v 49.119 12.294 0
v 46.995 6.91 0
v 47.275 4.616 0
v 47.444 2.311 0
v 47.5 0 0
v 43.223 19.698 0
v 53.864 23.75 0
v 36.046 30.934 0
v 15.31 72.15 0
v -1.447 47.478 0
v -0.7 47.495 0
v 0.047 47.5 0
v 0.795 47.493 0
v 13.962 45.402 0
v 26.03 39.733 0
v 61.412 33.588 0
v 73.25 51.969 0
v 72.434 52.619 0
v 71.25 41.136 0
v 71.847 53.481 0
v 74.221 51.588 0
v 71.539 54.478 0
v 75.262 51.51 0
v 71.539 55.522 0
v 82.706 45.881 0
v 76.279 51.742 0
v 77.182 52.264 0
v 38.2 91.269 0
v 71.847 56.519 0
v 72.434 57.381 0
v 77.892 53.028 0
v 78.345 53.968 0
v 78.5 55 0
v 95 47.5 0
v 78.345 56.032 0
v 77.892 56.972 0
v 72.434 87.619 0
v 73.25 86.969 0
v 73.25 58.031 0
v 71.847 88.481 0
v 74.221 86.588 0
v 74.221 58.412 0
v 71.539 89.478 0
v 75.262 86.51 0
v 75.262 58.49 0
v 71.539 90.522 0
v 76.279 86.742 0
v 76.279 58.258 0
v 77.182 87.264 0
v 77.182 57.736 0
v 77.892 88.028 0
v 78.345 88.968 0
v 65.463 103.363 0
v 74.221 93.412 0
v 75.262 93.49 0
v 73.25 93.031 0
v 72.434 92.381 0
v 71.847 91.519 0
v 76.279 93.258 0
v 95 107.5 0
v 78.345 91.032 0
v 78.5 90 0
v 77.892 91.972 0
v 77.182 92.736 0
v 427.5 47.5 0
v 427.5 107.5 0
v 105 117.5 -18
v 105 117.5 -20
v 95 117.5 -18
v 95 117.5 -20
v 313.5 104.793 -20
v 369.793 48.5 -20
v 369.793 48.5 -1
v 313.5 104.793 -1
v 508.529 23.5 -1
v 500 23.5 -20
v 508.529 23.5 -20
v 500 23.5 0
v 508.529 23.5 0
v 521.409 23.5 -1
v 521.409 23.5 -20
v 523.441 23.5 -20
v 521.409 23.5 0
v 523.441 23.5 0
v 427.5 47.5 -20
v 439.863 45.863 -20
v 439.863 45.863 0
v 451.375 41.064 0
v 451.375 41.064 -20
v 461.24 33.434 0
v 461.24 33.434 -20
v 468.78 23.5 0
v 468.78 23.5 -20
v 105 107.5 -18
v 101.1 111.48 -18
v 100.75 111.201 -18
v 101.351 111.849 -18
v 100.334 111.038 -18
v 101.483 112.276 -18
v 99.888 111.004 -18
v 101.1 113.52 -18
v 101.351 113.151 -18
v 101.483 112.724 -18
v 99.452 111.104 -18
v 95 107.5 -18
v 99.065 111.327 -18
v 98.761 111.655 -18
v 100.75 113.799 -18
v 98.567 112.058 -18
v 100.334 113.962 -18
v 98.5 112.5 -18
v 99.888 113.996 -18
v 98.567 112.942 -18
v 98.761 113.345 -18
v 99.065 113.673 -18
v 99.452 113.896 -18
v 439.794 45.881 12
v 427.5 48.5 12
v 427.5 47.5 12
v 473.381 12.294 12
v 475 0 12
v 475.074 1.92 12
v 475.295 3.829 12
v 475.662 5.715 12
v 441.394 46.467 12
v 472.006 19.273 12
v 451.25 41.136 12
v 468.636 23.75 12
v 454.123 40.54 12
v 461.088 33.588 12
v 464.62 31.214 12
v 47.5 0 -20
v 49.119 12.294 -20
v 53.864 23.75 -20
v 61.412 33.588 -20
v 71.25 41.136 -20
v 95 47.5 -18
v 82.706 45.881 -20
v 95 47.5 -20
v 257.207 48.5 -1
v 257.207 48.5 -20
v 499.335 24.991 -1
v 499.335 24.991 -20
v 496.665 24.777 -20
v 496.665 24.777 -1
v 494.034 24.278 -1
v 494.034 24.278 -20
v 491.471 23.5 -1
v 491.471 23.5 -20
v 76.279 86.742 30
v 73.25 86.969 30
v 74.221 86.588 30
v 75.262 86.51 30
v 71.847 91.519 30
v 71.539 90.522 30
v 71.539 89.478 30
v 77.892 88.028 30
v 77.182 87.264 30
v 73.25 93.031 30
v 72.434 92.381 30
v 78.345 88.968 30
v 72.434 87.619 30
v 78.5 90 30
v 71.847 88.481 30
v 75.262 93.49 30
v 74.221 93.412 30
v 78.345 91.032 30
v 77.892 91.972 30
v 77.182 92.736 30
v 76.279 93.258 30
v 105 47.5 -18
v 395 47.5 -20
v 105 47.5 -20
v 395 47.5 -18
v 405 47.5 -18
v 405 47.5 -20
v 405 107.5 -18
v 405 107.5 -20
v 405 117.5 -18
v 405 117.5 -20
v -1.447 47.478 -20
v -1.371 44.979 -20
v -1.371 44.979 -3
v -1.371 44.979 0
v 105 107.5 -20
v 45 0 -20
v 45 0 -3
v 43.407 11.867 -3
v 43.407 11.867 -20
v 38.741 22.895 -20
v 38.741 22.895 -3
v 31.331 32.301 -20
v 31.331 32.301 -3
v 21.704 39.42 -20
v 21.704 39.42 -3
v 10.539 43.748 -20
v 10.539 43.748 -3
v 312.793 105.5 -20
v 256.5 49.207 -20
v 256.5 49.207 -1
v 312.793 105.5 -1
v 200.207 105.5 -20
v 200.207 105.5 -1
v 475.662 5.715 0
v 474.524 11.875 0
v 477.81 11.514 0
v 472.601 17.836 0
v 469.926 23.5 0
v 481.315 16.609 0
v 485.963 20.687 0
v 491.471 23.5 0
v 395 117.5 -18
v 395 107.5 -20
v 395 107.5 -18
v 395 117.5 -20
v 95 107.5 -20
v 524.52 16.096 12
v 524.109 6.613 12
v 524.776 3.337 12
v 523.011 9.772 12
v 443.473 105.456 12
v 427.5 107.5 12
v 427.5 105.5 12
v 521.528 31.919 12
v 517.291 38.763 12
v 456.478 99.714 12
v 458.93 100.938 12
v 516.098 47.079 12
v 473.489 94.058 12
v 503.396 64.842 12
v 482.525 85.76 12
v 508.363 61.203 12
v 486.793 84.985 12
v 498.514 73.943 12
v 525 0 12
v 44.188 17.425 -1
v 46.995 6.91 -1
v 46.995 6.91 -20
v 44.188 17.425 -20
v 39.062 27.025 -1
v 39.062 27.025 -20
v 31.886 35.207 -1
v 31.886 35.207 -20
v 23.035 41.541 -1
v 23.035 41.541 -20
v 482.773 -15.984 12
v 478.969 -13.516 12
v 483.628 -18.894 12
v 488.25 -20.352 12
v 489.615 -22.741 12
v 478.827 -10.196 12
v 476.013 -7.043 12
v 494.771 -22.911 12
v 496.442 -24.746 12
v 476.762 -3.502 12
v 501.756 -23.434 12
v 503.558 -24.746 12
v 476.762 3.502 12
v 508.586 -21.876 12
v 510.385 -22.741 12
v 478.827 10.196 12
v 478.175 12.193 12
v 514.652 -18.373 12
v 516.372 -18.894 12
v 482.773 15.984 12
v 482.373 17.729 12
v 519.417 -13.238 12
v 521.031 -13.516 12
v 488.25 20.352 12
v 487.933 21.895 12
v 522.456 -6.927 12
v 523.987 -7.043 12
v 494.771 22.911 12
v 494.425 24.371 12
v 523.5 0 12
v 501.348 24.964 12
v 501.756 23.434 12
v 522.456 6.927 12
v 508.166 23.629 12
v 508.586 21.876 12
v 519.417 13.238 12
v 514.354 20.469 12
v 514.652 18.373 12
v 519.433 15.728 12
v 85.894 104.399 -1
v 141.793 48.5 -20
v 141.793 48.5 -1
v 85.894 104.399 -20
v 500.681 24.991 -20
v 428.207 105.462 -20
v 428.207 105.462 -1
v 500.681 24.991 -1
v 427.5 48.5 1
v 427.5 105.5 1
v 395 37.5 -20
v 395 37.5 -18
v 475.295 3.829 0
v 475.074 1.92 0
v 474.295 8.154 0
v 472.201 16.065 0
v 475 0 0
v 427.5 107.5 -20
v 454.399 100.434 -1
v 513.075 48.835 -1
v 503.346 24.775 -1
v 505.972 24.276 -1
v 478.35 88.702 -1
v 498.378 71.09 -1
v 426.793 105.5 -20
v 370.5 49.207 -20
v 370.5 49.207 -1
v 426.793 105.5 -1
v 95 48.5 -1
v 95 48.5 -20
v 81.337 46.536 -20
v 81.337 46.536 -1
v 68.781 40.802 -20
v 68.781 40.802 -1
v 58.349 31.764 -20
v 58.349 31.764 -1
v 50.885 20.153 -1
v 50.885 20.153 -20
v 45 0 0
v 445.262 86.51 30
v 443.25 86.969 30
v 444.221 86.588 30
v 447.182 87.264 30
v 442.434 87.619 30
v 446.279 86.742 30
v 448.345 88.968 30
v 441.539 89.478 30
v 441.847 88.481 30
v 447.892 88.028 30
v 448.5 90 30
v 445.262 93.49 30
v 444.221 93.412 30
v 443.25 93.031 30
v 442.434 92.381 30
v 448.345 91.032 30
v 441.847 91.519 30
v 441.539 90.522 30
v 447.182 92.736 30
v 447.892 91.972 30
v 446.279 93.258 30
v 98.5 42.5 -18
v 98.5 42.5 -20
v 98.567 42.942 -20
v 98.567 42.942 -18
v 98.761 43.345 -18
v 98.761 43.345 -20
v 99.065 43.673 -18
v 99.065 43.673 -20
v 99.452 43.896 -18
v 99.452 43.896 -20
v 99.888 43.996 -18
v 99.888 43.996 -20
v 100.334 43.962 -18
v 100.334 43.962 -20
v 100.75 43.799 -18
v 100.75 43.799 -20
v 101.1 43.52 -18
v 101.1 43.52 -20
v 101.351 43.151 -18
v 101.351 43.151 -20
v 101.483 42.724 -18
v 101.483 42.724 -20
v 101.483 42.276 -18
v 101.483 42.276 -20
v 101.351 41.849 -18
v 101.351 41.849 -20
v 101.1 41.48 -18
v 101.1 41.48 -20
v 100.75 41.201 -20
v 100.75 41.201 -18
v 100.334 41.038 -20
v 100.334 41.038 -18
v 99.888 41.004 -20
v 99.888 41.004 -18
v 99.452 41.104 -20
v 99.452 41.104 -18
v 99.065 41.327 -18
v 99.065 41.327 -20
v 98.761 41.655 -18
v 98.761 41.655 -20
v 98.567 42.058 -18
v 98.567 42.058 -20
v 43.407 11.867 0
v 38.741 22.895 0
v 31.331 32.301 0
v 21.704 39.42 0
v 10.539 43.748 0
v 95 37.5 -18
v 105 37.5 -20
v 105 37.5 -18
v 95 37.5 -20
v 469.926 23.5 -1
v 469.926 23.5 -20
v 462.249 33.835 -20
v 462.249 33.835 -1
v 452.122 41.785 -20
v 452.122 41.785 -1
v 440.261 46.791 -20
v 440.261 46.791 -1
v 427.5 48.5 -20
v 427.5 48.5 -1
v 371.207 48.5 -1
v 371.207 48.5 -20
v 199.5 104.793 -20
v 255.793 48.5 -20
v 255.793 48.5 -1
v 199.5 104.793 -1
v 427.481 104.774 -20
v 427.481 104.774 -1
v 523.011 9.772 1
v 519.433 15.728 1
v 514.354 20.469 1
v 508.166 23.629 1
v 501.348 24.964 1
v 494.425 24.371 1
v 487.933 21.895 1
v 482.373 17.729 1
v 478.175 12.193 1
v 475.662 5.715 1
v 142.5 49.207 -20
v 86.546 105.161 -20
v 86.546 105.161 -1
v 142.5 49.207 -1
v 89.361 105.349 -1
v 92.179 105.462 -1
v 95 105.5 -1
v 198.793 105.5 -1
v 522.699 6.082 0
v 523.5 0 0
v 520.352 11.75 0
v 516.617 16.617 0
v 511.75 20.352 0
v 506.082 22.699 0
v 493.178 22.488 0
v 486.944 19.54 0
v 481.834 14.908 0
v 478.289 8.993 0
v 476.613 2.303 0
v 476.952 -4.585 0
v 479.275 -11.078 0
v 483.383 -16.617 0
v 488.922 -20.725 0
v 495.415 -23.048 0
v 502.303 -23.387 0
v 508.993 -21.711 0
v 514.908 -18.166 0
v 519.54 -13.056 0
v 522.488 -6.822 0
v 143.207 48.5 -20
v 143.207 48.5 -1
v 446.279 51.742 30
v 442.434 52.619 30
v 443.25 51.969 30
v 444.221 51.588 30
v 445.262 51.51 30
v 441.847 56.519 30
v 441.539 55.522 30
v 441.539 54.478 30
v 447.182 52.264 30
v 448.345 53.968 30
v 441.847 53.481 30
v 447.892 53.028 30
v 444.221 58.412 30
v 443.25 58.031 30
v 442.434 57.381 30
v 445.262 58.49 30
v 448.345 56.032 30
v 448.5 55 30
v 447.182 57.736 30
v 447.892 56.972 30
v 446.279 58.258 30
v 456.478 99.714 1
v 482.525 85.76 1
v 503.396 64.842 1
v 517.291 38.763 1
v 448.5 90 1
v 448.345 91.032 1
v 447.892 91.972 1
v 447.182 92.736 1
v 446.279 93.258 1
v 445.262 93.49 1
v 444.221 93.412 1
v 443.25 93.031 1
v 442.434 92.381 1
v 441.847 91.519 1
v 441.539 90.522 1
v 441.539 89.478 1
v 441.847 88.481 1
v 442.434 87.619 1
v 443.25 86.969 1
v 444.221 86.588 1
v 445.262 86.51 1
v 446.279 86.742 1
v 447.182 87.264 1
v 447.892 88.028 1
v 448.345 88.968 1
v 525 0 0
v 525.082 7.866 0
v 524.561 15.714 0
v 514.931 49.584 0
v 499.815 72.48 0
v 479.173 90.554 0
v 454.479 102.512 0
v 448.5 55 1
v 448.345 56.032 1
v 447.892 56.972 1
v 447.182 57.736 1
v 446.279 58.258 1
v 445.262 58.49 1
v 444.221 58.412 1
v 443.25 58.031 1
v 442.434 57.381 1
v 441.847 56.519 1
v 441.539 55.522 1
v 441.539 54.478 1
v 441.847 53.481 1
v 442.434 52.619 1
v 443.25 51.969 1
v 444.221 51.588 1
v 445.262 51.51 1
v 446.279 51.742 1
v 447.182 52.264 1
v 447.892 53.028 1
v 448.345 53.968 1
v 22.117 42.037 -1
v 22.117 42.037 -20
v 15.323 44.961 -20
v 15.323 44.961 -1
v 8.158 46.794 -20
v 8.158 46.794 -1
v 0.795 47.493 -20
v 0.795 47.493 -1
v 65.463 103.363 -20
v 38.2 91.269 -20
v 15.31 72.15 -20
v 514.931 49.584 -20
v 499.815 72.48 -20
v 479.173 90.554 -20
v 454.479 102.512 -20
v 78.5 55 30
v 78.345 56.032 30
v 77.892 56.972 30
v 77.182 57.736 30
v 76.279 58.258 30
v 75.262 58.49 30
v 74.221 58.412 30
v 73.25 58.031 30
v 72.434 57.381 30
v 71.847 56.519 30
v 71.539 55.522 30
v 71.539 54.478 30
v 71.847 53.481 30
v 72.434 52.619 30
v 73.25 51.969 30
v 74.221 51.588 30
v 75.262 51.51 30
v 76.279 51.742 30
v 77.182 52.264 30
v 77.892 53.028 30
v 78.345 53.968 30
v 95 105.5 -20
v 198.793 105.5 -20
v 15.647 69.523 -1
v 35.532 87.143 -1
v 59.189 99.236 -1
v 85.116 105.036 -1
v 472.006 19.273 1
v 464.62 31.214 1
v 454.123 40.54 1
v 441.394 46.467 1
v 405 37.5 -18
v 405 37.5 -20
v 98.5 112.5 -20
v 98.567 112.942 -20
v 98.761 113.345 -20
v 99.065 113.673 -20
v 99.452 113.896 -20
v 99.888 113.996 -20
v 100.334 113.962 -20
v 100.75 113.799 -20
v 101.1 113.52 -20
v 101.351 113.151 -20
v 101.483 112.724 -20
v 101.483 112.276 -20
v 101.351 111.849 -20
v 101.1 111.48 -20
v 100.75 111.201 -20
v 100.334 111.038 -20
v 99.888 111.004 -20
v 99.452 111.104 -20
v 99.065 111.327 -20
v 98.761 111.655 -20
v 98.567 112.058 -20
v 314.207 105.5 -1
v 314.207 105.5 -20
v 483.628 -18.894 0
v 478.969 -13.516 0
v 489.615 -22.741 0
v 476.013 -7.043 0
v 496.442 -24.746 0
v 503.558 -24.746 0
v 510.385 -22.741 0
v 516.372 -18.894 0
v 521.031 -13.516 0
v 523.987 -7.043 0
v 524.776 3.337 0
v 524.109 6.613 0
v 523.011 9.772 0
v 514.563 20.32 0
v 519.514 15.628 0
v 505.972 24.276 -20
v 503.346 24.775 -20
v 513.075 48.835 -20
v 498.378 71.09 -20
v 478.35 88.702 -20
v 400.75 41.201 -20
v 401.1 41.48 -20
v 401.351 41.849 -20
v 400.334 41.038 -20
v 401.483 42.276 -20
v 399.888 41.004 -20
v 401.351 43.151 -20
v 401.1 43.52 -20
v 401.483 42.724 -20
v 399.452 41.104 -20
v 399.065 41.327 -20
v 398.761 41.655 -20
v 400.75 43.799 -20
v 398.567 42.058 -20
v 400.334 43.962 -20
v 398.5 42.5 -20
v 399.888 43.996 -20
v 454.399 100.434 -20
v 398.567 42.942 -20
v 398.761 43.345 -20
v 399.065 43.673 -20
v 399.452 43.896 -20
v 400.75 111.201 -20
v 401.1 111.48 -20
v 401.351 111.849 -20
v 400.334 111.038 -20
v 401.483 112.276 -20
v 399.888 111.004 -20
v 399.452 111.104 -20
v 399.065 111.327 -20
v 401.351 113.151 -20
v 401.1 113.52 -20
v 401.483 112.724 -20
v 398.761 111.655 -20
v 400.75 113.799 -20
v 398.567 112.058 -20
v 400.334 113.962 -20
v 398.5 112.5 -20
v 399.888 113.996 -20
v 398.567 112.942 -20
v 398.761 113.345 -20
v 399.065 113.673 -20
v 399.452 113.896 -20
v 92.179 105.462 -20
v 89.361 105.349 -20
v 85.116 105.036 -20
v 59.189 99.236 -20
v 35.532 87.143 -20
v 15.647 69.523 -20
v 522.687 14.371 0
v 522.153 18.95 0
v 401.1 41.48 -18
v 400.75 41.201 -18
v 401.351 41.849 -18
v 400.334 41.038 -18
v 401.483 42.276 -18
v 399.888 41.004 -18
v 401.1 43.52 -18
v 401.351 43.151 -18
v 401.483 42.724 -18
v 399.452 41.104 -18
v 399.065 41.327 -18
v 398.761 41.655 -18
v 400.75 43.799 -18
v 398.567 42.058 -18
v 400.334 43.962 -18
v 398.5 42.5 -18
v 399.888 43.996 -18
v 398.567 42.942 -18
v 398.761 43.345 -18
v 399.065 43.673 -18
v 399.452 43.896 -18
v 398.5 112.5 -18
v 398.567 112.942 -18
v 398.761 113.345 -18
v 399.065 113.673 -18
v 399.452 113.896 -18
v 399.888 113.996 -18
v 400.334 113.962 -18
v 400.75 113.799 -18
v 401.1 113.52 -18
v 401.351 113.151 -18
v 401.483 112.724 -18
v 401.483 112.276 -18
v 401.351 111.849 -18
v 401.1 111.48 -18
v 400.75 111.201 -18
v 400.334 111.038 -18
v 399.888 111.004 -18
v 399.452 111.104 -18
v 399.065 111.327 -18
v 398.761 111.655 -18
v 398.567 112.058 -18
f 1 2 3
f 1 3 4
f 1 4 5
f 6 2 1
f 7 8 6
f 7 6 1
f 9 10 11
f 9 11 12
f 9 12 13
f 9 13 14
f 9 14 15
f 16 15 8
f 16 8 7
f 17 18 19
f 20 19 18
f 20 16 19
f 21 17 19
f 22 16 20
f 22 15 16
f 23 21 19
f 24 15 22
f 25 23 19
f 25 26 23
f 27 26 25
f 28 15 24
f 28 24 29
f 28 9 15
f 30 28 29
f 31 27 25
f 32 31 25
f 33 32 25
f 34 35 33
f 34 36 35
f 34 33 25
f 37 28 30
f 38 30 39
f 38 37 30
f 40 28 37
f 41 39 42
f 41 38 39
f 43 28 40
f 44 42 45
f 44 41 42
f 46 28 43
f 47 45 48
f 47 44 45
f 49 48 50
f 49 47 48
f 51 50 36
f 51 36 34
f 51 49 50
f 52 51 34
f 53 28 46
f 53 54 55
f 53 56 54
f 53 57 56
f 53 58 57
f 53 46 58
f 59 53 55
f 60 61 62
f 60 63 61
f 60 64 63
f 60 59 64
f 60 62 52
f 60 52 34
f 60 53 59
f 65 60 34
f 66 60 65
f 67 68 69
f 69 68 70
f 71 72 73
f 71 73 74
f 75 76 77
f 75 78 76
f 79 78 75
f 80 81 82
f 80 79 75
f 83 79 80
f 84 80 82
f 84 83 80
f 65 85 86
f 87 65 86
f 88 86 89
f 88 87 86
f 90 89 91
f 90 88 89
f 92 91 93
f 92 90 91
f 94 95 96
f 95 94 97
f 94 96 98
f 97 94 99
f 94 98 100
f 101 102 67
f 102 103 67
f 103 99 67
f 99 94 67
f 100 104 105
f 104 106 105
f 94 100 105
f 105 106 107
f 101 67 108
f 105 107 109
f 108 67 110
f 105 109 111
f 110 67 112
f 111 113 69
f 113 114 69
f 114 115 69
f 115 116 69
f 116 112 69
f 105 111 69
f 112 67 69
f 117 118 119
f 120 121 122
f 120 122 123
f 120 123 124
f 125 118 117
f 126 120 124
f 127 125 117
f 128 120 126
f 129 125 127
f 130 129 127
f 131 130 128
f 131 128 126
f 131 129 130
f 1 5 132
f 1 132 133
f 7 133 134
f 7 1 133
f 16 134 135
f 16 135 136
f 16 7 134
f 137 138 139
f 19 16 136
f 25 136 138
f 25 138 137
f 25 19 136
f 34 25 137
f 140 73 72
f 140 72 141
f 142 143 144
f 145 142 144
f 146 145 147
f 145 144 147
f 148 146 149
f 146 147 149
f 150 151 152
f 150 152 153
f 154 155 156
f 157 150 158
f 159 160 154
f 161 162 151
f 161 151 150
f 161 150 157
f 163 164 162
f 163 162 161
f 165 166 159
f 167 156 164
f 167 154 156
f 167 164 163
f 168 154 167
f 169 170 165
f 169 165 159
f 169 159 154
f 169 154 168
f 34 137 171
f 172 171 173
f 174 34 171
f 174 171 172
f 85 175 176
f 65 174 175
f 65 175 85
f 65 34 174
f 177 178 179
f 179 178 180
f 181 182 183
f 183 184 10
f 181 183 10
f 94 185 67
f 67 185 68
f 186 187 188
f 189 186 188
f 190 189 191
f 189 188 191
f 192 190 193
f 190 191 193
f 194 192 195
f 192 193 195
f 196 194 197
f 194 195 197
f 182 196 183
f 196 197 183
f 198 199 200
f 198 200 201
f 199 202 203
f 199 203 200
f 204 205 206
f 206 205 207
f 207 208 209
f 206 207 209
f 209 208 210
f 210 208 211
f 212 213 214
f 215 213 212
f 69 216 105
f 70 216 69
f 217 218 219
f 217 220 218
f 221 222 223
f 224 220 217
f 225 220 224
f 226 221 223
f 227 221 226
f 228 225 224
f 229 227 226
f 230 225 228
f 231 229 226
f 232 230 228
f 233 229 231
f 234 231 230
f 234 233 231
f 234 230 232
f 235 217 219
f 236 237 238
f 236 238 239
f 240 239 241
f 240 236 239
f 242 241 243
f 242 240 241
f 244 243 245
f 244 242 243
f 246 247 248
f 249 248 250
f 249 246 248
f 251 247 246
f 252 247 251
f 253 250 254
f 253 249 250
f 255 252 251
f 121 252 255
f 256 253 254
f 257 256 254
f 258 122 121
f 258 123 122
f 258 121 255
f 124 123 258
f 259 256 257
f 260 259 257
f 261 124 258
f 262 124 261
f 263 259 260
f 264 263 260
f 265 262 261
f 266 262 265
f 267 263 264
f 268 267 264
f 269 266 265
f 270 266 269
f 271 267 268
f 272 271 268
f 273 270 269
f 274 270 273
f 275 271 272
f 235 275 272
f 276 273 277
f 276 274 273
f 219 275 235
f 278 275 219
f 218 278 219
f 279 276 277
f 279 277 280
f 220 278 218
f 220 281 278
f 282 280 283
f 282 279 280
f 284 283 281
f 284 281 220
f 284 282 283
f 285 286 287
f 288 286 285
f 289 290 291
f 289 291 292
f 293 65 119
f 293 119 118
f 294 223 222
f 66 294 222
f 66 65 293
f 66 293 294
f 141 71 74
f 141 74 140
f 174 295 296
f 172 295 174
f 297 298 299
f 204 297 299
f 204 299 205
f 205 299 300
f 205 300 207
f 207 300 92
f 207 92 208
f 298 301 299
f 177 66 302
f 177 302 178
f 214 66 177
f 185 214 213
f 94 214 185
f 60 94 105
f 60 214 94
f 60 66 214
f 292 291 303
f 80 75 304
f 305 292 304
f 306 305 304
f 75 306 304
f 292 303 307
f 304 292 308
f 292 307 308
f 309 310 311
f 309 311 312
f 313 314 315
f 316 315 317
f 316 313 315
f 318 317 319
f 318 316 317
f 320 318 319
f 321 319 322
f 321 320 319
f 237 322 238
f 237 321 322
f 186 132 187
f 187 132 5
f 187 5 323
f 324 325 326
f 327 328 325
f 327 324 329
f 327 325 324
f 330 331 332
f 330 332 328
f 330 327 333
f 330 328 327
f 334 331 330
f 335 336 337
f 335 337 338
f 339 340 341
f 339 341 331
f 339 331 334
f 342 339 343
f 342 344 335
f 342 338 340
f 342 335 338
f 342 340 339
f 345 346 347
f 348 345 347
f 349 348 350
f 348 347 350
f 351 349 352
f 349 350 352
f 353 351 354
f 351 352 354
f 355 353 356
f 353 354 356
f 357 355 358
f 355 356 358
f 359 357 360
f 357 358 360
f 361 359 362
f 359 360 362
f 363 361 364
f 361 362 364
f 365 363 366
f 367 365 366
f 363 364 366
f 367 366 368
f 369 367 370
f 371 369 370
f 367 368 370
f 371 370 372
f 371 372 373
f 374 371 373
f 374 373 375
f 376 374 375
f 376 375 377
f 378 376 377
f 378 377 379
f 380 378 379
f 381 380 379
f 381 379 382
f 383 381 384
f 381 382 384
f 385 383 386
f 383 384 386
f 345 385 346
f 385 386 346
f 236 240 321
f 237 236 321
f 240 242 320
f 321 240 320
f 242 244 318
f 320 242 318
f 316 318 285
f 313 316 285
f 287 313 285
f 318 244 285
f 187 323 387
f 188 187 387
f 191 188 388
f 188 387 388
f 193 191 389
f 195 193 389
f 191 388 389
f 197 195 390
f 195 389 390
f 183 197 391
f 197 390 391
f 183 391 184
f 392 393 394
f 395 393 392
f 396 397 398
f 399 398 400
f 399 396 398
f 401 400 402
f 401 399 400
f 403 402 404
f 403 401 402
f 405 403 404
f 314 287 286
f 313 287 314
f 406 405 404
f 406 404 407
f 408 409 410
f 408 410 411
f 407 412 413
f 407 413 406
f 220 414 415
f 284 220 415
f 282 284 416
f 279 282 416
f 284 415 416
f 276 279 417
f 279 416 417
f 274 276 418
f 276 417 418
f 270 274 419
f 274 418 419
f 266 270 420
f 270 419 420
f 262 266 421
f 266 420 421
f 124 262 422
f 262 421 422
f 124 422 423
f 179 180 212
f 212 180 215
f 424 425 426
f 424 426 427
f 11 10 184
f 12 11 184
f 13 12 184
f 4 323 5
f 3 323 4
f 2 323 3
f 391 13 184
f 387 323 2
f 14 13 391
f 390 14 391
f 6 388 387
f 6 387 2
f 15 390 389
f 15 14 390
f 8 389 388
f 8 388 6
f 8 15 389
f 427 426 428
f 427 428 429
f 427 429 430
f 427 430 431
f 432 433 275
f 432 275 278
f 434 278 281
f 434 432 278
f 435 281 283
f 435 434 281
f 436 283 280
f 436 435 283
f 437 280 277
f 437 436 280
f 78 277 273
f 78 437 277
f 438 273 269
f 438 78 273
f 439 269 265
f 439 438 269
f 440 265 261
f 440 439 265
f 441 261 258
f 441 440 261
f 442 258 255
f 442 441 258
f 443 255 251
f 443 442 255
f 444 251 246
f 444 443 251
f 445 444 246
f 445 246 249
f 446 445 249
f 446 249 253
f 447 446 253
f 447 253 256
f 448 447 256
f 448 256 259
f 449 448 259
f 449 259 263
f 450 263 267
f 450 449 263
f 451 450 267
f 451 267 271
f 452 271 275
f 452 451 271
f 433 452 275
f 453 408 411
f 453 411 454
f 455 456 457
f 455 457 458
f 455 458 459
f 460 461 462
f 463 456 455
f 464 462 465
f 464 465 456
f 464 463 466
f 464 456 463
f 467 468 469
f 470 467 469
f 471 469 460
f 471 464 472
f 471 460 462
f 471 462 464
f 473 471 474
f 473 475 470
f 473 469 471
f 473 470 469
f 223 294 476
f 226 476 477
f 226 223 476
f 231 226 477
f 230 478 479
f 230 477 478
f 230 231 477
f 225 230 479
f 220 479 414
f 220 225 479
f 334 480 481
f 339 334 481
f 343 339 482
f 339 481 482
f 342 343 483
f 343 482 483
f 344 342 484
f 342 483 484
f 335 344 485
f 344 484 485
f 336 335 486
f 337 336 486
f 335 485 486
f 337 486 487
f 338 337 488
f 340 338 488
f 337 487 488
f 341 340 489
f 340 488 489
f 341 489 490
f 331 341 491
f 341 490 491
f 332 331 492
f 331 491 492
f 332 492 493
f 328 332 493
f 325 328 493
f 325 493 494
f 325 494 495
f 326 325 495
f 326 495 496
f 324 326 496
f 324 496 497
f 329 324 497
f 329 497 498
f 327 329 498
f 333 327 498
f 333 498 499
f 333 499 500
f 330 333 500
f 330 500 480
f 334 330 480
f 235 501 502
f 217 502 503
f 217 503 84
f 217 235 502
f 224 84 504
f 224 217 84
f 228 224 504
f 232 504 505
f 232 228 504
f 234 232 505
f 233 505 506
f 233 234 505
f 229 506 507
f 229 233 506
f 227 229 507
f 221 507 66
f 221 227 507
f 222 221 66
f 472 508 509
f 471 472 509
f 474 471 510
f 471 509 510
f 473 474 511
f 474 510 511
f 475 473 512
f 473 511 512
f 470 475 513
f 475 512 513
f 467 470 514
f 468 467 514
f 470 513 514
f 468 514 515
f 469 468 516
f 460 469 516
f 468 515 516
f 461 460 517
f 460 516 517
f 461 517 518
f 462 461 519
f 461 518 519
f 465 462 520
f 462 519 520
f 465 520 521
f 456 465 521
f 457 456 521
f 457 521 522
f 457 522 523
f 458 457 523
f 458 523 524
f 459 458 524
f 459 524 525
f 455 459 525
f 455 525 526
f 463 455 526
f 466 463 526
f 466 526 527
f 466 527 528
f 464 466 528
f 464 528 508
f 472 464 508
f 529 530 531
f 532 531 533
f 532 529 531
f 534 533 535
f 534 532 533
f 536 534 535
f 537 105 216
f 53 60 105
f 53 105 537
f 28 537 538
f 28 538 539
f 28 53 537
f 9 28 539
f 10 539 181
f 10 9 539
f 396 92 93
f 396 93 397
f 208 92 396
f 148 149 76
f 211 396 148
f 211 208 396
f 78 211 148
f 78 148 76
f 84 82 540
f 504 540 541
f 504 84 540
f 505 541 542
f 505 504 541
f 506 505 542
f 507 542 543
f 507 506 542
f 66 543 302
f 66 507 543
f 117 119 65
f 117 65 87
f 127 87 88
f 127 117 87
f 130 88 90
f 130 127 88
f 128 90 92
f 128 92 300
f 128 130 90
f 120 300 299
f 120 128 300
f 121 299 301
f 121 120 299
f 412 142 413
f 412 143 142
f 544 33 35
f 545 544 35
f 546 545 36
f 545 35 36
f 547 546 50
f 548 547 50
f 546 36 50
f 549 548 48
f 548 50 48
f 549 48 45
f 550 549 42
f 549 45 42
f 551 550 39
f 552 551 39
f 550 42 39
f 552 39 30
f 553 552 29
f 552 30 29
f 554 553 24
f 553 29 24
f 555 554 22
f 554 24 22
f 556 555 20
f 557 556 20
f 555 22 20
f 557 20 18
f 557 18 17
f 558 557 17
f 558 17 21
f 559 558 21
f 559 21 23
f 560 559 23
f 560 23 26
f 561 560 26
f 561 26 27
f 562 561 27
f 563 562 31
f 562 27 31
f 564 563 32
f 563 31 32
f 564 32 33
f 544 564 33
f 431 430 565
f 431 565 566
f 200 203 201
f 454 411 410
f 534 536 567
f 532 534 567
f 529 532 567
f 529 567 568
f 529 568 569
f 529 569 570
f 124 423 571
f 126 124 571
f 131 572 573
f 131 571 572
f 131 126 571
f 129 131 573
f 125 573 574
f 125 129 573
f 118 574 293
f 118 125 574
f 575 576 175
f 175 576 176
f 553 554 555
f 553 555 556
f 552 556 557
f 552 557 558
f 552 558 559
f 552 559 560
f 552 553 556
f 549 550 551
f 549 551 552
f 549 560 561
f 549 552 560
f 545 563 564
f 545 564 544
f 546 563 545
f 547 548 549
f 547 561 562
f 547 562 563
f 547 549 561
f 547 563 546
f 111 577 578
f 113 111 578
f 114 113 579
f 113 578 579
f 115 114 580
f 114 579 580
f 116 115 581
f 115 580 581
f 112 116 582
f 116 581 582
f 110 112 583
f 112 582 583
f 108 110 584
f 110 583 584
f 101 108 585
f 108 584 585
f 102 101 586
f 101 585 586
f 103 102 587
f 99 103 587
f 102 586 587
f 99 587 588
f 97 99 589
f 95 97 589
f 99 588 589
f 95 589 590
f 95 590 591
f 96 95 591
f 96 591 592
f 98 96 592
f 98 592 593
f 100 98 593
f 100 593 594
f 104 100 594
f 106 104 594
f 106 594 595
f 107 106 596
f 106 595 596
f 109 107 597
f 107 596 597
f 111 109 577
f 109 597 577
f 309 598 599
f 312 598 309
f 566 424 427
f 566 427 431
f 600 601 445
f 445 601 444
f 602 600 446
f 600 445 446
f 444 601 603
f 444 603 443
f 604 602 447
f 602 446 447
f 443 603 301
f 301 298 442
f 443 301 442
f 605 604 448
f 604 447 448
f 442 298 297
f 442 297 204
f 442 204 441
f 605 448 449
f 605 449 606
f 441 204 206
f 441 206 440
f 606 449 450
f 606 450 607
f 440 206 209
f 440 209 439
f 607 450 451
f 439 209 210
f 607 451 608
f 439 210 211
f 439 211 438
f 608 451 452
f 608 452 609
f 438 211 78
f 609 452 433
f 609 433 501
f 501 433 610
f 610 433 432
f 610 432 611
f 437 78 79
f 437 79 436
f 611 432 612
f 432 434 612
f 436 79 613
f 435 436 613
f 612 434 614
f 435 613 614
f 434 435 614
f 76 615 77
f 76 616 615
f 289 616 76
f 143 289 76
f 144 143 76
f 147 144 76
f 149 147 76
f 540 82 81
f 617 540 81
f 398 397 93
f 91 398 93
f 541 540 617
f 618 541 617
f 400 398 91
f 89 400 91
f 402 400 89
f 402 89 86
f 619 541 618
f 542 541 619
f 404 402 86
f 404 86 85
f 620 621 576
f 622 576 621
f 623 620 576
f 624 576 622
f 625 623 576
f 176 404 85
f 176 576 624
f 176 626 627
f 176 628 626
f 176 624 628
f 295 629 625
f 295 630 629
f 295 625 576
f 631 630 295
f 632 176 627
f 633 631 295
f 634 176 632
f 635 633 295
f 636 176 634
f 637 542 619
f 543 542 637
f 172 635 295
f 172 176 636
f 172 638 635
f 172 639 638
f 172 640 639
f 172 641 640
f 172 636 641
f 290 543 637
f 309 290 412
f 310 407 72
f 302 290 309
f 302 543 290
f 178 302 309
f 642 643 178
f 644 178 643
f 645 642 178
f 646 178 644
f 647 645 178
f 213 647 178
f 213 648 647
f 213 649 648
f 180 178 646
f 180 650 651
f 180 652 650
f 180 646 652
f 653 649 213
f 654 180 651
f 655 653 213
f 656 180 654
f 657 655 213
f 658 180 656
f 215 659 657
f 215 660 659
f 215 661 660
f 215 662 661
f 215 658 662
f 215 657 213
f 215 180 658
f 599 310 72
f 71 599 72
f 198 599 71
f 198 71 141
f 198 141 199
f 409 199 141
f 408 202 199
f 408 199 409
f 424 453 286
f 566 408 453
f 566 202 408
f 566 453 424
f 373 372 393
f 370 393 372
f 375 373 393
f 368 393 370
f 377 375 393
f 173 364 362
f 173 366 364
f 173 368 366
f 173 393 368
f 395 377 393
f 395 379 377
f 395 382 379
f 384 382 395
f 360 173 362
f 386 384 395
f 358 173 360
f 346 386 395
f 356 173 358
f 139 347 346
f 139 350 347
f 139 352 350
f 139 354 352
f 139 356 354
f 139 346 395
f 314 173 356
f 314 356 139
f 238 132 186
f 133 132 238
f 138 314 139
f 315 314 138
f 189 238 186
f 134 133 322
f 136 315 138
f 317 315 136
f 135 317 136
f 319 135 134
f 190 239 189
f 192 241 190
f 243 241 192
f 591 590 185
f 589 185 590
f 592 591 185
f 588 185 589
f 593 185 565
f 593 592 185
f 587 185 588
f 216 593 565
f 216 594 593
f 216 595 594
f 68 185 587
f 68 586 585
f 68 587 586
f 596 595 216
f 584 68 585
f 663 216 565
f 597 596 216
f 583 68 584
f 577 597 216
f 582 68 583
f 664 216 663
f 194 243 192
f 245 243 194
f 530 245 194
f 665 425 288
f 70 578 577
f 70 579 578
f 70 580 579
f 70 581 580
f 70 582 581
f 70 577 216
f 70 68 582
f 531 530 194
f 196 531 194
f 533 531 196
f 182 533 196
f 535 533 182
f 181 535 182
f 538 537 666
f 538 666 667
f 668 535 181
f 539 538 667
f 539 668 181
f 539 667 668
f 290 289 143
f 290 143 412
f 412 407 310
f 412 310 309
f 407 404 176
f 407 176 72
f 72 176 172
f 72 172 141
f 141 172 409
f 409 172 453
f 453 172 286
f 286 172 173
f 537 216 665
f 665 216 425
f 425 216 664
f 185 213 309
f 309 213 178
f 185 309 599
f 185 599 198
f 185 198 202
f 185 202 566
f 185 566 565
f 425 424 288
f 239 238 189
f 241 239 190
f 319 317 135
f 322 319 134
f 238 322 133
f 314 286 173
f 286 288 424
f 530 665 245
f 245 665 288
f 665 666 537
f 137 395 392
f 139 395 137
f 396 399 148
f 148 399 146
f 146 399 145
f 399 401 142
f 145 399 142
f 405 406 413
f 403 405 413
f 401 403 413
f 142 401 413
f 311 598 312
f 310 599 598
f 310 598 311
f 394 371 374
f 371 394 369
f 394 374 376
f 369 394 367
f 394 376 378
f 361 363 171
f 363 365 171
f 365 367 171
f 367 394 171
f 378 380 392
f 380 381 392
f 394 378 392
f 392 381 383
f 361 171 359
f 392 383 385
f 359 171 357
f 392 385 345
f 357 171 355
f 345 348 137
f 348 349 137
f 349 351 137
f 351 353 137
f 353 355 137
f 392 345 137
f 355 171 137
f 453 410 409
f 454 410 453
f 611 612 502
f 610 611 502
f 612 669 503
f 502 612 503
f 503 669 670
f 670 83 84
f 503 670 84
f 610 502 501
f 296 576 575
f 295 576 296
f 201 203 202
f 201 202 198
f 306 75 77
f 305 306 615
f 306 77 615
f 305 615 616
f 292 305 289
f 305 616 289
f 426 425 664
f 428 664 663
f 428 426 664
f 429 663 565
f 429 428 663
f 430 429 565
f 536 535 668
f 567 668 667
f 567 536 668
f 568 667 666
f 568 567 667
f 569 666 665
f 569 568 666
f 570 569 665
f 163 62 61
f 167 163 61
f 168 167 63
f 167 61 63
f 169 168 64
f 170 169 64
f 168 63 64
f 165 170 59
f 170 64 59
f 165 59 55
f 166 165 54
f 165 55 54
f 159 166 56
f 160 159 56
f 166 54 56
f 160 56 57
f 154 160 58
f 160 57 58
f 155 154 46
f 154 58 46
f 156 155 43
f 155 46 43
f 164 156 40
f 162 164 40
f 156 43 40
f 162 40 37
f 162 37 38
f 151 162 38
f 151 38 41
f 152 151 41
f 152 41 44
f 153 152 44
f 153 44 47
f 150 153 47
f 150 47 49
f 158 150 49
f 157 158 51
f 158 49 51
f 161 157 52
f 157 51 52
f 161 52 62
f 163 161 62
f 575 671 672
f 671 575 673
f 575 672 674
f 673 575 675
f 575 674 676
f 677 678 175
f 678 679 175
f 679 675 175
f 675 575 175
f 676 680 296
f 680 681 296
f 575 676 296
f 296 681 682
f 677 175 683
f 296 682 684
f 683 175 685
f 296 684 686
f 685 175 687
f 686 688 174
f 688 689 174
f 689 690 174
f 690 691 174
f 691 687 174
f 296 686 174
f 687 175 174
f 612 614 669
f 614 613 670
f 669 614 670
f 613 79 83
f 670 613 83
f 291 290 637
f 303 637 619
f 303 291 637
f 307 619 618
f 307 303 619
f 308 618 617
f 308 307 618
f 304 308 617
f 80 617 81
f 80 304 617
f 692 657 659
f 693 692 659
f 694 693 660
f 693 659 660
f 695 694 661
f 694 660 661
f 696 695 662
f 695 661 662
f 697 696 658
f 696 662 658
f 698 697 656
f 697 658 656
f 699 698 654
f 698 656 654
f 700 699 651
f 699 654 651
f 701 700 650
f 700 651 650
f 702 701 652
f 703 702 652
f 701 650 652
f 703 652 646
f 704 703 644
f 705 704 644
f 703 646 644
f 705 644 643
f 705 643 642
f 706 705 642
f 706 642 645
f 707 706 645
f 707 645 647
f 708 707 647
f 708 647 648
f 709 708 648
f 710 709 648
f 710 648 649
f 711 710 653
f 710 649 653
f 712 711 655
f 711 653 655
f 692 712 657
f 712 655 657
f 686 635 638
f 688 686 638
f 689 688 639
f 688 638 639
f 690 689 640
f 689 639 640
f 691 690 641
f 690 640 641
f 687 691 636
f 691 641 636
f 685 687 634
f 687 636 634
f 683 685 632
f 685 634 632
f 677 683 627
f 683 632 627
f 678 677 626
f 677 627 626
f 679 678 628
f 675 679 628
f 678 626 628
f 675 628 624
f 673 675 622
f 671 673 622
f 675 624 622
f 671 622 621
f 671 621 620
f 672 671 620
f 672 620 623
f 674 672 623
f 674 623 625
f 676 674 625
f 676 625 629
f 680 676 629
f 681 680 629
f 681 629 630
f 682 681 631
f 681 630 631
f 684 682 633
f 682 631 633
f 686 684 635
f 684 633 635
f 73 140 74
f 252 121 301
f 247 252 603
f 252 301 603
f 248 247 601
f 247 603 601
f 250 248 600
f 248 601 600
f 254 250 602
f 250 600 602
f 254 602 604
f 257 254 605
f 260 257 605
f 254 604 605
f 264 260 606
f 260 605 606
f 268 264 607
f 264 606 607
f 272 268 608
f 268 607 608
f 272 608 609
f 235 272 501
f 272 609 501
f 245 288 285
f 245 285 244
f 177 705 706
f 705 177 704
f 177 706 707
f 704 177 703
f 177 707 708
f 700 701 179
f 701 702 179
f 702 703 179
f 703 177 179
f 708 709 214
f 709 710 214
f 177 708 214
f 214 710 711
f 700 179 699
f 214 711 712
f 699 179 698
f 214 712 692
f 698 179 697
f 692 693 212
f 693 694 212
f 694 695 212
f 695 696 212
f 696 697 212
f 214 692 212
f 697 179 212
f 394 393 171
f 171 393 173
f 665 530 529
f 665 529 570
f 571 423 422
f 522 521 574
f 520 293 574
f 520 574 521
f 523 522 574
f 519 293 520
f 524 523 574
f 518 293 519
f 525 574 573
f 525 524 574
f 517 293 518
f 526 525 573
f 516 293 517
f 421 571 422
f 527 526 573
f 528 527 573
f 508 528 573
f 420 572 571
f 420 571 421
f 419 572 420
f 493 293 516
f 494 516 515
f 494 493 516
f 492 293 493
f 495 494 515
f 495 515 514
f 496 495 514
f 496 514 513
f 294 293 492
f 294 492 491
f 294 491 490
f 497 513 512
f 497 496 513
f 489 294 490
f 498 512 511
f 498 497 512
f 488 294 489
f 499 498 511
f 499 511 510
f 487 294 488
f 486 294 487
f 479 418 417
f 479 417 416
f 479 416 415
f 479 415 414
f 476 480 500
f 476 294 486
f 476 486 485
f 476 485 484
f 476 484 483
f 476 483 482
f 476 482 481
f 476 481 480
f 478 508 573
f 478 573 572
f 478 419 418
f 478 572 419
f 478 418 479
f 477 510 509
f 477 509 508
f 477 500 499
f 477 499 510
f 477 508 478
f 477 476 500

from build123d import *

# Parameters (mm, degrees)
BOSS_EXTRUDE1_DEPTH      = 1
SKETCH1_5_R              = 47.5
SKETCH1_5_R_2            = 25
BOSS_EXTRUDE2_DEPTH      = 3
SKETCH1_6_R              = 45
BOSS_EXTRUDE3_DEPTH      = 20
BOSS_EXTRUDE4_DEPTH      = 12
BOSS_EXTRUDE4_DEPTH_BACK = 20
SKETCH1_7_R              = 23.5
SKETCH4_W                = 10
SKETCH4_H                = 10
SKETCH4_R                = 1.5
BOSS_EXTRUDE5_DEPTH      = 2
RIB1_REACH               = 541.058
SKETCH5_R                = 25
SKETCH5_W                = 65.707634962
SKETCH5_H                = 50.574965667
CUT_EXTRUDE2_DEPTH       = 20
BOSS_EXTRUDE7_START      = 12
BOSS_EXTRUDE7_DEPTH      = 12
BOSS_EXTRUDE8_START      = 1
BOSS_EXTRUDE8_DEPTH      = 1
SKETCH6_W                = 432.5
SKETCH6_H                = 112.5
CUT_EXTRUDE3_DEPTH       = 20
SKETCH7_R                = 3.5
BOSS_EXTRUDE9_DEPTH      = 30


with BuildPart() as part:
    # Sketch1 → Boss-Extrude1 (new body)
    with BuildSketch(Plane.XY):
        with BuildLine():
            ThreePointArc((95, 105.5), (39.684082468, 89.835400971), (0.794736842, 47.493351044))
            ThreePointArc((0.794736842, 47.493351044), (31.348293783, 35.686614815), (46.994736842, 6.909754637))
            ThreePointArc((46.994736842, 6.909754637), (63.242112003, 36.656330285), (95, 48.5))
            Line((95, 48.5), (427.5, 48.5))
            ThreePointArc((427.5, 48.5), (459.710681482, 36.25909539), (475.662068966, 5.715340144))
            ThreePointArc((475.662068966, 5.715340144), (497.865985258, 24.908753102), (523.011089442, 9.771886344))
            ThreePointArc((523.011089442, 9.771886344), (493.732825543, 76.071334342), (427.5, 105.5))
            Line((427.5, 105.5), (95, 105.5))
        make_face()
    extrude(amount=-BOSS_EXTRUDE1_DEPTH)

    # Sketch1<5> → Boss-Extrude2 (add)
    with BuildSketch(Plane.XY):
        Circle(SKETCH1_5_R)
        Circle(SKETCH1_5_R_2, mode=Mode.SUBTRACT)
    extrude(amount=-BOSS_EXTRUDE2_DEPTH)

    # Sketch1<6> → Boss-Extrude3 (add)
    with BuildSketch(Plane.XY):
        with BuildLine():
            Line((427.5, 107.5), (95, 107.5))
            ThreePointArc((95, 107.5), (38.200479459, 91.269186839), (-1.447368421, 47.47794356))
            ThreePointArc((-1.447368421, 47.47794356), (-33.071891388, -34.095454242), (47.5, 0))
            ThreePointArc((47.5, 0), (61.412427894, 33.587572106), (95, 47.5))
            Line((95, 47.5), (427.5, 47.5))
            ThreePointArc((427.5, 47.5), (461.087572106, 33.587572106), (475, 0))
            ThreePointArc((475, 0), (475.166068818, 2.876779809), (475.662068966, 5.715340144))
            ThreePointArc((475.662068966, 5.715340144), (459.710681482, 36.25909539), (427.5, 48.5))
            Line((427.5, 48.5), (95, 48.5))
            ThreePointArc((95, 48.5), (63.242112003, 36.656330285), (46.994736842, 6.909754637))
            ThreePointArc((46.994736842, 6.909754637), (31.348293783, 35.686614815), (0.794736842, 47.493351044))
            ThreePointArc((0.794736842, 47.493351044), (39.684082468, 89.835400971), (95, 105.5))
            Line((95, 105.5), (427.5, 105.5))
            ThreePointArc((427.5, 105.5), (493.732825543, 76.071334342), (523.011089442, 9.771886344))
            ThreePointArc((523.011089442, 9.771886344), (524.497726793, 4.98611893), (525, 0))
            ThreePointArc((525, 0), (498.513978978, 73.942911166), (427.5, 107.5))
        make_face()
        Circle(SKETCH1_6_R, mode=Mode.SUBTRACT)
    extrude(amount=-BOSS_EXTRUDE3_DEPTH)

    # Sketch1<7> → Boss-Extrude4 (add, two sides: drawn at the far end of the back side and taken through both)
    with BuildSketch(Plane.XY.offset(-BOSS_EXTRUDE4_DEPTH_BACK)):
        with BuildLine():
            ThreePointArc((475, 0), (500, -25), (525, 0))
            ThreePointArc((525, 0), (524.497726793, 4.98611893), (523.011089442, 9.771886344))
            ThreePointArc((523.011089442, 9.771886344), (497.865985258, 24.908753102), (475.662068966, 5.715340144))
            ThreePointArc((475.662068966, 5.715340144), (475.166068818, 2.876779809), (475, 0))
        make_face()
        with Locations((500, 0)):
            Circle(SKETCH1_7_R, mode=Mode.SUBTRACT)
    extrude(amount=BOSS_EXTRUDE4_DEPTH + BOSS_EXTRUDE4_DEPTH_BACK)

    # Sketch4 → Boss-Extrude5 (add)
    # profile 1 of 4: a face of its own
    with BuildSketch(Plane(origin=(0, 0, -20), x_dir=(-1, 0, 0), z_dir=(0, 0, -1))):
        with Locations((-100, 112.5)):
            Rectangle(SKETCH4_W, SKETCH4_H)
        with Locations((-100, 112.5)):
            Circle(SKETCH4_R, mode=Mode.SUBTRACT)
    # profile 2 of 4: a face of its own
    with BuildSketch(Plane(origin=(0, 0, -20), x_dir=(-1, 0, 0), z_dir=(0, 0, -1))):
        with Locations((-100, 42.5)):
            Rectangle(SKETCH4_W, SKETCH4_H)
        with Locations((-100, 42.5)):
            Circle(SKETCH4_R, mode=Mode.SUBTRACT)
    # profile 3 of 4: a face of its own
    with BuildSketch(Plane(origin=(0, 0, -20), x_dir=(-1, 0, 0), z_dir=(0, 0, -1))):
        with Locations((-400, 42.5)):
            Rectangle(SKETCH4_W, SKETCH4_H)
        with Locations((-400, 42.5)):
            Circle(SKETCH4_R, mode=Mode.SUBTRACT)
    # profile 4 of 4: a face of its own
    with BuildSketch(Plane(origin=(0, 0, -20), x_dir=(-1, 0, 0), z_dir=(0, 0, -1))):
        with Locations((-400, 112.5)):
            Rectangle(SKETCH4_W, SKETCH4_H)
        with Locations((-400, 112.5)):
            Circle(SKETCH4_R, mode=Mode.SUBTRACT)
    extrude(amount=-BOSS_EXTRUDE5_DEPTH)

    # Sketch2 walls → Rib1 (add, up to next)
    with BuildSketch(Plane(origin=(0, 0, -20), x_dir=(-1, 0, 0), z_dir=(0, 0, -1)), mode=Mode.PRIVATE) as rib1_sk1:
        Polygon((-861.045730636, -376.632398349), (-427.481030572, 104.773923791), (-370.5, 47.792893219), (-313.5, 104.792893219), (-256.5, 47.792893219), (-199.5, 104.792893219), (-142.5, 47.792893219), (-85.893739398, 104.399153821), (358.946648956, -340.441234532), (359.653755737, -339.734127751), (-85.893739398, 105.813367384), (-142.5, 49.207106781), (-199.5, 106.207106781), (-256.5, 49.207106781), (-313.5, 106.207106781), (-370.5, 49.207106781), (-427.518969428, 106.226076209), (-861.788795248, -375.963178667), align=None)
    rib1_tool1 = extrude(rib1_sk1.sketch, amount=-RIB1_REACH, mode=Mode.PRIVATE) - part.part
    add(rib1_tool1.solids().sort_by_distance((228, 77, -20))[0])

    # Sketch5 → Cut-Extrude2 (cut)
    # profile 1 of 2: a face of its own
    with BuildSketch(Plane.XY):
        with BuildLine():
            ThreePointArc((45, 0), (31.331265526, 32.300956651), (-1.371191136, 44.979104425))
            Line((-1.371191136, 44.979104425), (-1.447368421, 47.47794356))
            ThreePointArc((-1.447368421, 47.47794356), (-33.071891388, -34.095454242), (47.5, 0))
            Line((47.5, 0), (45, 0))
        make_face()
        Circle(SKETCH5_R, mode=Mode.SUBTRACT)
    # profile 2 of 2: a face of its own
    with BuildSketch(Plane.XY):
        with Locations((499.303565133, -1.787482834)):
            Rectangle(SKETCH5_W, SKETCH5_H)
    extrude(amount=-CUT_EXTRUDE2_DEPTH, mode=Mode.SUBTRACT)

    # Sketch1<10> → Boss-Extrude7 (add)
    with BuildSketch(Plane.XY.offset(BOSS_EXTRUDE7_START)):
        with BuildLine():
            Line((427.5, 107.5), (95, 107.5))
            ThreePointArc((95, 107.5), (38.200479459, 91.269186839), (-1.447368421, 47.47794356))
            ThreePointArc((-1.447368421, 47.47794356), (-0.326406713, 47.498878499), (0.794736842, 47.493351044))
            ThreePointArc((0.794736842, 47.493351044), (39.684082468, 89.835400971), (95, 105.5))
            Line((95, 105.5), (427.5, 105.5))
            ThreePointArc((427.5, 105.5), (493.732825543, 76.071334342), (523.011089442, 9.771886344))
            ThreePointArc((523.011089442, 9.771886344), (524.497726793, 4.98611893), (525, 0))
            ThreePointArc((525, 0), (498.513978978, 73.942911166), (427.5, 107.5))
        make_face()
        with BuildLine():
            ThreePointArc((46.994736842, 6.909754637), (47.373515808, 3.464101615), (47.5, 0))
            ThreePointArc((47.5, 0), (61.412427894, 33.587572106), (95, 47.5))
            Line((95, 47.5), (427.5, 47.5))
            ThreePointArc((427.5, 47.5), (461.087572106, 33.587572106), (475, 0))
            ThreePointArc((475, 0), (475.166068818, 2.876779809), (475.662068966, 5.715340144))
            ThreePointArc((475.662068966, 5.715340144), (459.710681482, 36.25909539), (427.5, 48.5))
            Line((427.5, 48.5), (95, 48.5))
            ThreePointArc((95, 48.5), (63.242112003, 36.656330285), (46.994736842, 6.909754637))
        make_face()
    extrude(amount=-BOSS_EXTRUDE7_DEPTH)

    # Sketch1<11> → Boss-Extrude8 (add)
    with BuildSketch(Plane.XY.offset(BOSS_EXTRUDE8_START)):
        with BuildLine():
            ThreePointArc((95, 105.5), (39.684082468, 89.835400971), (0.794736842, 47.493351044))
            ThreePointArc((0.794736842, 47.493351044), (31.348293783, 35.686614815), (46.994736842, 6.909754637))
            ThreePointArc((46.994736842, 6.909754637), (63.242112003, 36.656330285), (95, 48.5))
            Line((95, 48.5), (427.5, 48.5))
            ThreePointArc((427.5, 48.5), (459.710681482, 36.25909539), (475.662068966, 5.715340144))
            ThreePointArc((475.662068966, 5.715340144), (497.865985258, 24.908753102), (523.011089442, 9.771886344))
            ThreePointArc((523.011089442, 9.771886344), (493.732825543, 76.071334342), (427.5, 105.5))
            Line((427.5, 105.5), (95, 105.5))
        make_face()
    extrude(amount=-BOSS_EXTRUDE8_DEPTH)

    # Sketch6 → Cut-Extrude3 (cut)
    with BuildSketch(Plane.XY):
        with Locations((211.25, 51.25)):
            Rectangle(SKETCH6_W, SKETCH6_H)
    extrude(amount=CUT_EXTRUDE3_DEPTH, mode=Mode.SUBTRACT)

    # Sketch7 → Boss-Extrude9 (add)
    with BuildSketch(Plane.XY):
        with Locations((75, 55)):
            Circle(SKETCH7_R)
        with Locations((75, 90)):
            Circle(SKETCH7_R)
        with Locations((445, 55)):
            Circle(SKETCH7_R)
        with Locations((445, 90)):
            Circle(SKETCH7_R)
    extrude(amount=BOSS_EXTRUDE9_DEPTH)


solid = part.part
